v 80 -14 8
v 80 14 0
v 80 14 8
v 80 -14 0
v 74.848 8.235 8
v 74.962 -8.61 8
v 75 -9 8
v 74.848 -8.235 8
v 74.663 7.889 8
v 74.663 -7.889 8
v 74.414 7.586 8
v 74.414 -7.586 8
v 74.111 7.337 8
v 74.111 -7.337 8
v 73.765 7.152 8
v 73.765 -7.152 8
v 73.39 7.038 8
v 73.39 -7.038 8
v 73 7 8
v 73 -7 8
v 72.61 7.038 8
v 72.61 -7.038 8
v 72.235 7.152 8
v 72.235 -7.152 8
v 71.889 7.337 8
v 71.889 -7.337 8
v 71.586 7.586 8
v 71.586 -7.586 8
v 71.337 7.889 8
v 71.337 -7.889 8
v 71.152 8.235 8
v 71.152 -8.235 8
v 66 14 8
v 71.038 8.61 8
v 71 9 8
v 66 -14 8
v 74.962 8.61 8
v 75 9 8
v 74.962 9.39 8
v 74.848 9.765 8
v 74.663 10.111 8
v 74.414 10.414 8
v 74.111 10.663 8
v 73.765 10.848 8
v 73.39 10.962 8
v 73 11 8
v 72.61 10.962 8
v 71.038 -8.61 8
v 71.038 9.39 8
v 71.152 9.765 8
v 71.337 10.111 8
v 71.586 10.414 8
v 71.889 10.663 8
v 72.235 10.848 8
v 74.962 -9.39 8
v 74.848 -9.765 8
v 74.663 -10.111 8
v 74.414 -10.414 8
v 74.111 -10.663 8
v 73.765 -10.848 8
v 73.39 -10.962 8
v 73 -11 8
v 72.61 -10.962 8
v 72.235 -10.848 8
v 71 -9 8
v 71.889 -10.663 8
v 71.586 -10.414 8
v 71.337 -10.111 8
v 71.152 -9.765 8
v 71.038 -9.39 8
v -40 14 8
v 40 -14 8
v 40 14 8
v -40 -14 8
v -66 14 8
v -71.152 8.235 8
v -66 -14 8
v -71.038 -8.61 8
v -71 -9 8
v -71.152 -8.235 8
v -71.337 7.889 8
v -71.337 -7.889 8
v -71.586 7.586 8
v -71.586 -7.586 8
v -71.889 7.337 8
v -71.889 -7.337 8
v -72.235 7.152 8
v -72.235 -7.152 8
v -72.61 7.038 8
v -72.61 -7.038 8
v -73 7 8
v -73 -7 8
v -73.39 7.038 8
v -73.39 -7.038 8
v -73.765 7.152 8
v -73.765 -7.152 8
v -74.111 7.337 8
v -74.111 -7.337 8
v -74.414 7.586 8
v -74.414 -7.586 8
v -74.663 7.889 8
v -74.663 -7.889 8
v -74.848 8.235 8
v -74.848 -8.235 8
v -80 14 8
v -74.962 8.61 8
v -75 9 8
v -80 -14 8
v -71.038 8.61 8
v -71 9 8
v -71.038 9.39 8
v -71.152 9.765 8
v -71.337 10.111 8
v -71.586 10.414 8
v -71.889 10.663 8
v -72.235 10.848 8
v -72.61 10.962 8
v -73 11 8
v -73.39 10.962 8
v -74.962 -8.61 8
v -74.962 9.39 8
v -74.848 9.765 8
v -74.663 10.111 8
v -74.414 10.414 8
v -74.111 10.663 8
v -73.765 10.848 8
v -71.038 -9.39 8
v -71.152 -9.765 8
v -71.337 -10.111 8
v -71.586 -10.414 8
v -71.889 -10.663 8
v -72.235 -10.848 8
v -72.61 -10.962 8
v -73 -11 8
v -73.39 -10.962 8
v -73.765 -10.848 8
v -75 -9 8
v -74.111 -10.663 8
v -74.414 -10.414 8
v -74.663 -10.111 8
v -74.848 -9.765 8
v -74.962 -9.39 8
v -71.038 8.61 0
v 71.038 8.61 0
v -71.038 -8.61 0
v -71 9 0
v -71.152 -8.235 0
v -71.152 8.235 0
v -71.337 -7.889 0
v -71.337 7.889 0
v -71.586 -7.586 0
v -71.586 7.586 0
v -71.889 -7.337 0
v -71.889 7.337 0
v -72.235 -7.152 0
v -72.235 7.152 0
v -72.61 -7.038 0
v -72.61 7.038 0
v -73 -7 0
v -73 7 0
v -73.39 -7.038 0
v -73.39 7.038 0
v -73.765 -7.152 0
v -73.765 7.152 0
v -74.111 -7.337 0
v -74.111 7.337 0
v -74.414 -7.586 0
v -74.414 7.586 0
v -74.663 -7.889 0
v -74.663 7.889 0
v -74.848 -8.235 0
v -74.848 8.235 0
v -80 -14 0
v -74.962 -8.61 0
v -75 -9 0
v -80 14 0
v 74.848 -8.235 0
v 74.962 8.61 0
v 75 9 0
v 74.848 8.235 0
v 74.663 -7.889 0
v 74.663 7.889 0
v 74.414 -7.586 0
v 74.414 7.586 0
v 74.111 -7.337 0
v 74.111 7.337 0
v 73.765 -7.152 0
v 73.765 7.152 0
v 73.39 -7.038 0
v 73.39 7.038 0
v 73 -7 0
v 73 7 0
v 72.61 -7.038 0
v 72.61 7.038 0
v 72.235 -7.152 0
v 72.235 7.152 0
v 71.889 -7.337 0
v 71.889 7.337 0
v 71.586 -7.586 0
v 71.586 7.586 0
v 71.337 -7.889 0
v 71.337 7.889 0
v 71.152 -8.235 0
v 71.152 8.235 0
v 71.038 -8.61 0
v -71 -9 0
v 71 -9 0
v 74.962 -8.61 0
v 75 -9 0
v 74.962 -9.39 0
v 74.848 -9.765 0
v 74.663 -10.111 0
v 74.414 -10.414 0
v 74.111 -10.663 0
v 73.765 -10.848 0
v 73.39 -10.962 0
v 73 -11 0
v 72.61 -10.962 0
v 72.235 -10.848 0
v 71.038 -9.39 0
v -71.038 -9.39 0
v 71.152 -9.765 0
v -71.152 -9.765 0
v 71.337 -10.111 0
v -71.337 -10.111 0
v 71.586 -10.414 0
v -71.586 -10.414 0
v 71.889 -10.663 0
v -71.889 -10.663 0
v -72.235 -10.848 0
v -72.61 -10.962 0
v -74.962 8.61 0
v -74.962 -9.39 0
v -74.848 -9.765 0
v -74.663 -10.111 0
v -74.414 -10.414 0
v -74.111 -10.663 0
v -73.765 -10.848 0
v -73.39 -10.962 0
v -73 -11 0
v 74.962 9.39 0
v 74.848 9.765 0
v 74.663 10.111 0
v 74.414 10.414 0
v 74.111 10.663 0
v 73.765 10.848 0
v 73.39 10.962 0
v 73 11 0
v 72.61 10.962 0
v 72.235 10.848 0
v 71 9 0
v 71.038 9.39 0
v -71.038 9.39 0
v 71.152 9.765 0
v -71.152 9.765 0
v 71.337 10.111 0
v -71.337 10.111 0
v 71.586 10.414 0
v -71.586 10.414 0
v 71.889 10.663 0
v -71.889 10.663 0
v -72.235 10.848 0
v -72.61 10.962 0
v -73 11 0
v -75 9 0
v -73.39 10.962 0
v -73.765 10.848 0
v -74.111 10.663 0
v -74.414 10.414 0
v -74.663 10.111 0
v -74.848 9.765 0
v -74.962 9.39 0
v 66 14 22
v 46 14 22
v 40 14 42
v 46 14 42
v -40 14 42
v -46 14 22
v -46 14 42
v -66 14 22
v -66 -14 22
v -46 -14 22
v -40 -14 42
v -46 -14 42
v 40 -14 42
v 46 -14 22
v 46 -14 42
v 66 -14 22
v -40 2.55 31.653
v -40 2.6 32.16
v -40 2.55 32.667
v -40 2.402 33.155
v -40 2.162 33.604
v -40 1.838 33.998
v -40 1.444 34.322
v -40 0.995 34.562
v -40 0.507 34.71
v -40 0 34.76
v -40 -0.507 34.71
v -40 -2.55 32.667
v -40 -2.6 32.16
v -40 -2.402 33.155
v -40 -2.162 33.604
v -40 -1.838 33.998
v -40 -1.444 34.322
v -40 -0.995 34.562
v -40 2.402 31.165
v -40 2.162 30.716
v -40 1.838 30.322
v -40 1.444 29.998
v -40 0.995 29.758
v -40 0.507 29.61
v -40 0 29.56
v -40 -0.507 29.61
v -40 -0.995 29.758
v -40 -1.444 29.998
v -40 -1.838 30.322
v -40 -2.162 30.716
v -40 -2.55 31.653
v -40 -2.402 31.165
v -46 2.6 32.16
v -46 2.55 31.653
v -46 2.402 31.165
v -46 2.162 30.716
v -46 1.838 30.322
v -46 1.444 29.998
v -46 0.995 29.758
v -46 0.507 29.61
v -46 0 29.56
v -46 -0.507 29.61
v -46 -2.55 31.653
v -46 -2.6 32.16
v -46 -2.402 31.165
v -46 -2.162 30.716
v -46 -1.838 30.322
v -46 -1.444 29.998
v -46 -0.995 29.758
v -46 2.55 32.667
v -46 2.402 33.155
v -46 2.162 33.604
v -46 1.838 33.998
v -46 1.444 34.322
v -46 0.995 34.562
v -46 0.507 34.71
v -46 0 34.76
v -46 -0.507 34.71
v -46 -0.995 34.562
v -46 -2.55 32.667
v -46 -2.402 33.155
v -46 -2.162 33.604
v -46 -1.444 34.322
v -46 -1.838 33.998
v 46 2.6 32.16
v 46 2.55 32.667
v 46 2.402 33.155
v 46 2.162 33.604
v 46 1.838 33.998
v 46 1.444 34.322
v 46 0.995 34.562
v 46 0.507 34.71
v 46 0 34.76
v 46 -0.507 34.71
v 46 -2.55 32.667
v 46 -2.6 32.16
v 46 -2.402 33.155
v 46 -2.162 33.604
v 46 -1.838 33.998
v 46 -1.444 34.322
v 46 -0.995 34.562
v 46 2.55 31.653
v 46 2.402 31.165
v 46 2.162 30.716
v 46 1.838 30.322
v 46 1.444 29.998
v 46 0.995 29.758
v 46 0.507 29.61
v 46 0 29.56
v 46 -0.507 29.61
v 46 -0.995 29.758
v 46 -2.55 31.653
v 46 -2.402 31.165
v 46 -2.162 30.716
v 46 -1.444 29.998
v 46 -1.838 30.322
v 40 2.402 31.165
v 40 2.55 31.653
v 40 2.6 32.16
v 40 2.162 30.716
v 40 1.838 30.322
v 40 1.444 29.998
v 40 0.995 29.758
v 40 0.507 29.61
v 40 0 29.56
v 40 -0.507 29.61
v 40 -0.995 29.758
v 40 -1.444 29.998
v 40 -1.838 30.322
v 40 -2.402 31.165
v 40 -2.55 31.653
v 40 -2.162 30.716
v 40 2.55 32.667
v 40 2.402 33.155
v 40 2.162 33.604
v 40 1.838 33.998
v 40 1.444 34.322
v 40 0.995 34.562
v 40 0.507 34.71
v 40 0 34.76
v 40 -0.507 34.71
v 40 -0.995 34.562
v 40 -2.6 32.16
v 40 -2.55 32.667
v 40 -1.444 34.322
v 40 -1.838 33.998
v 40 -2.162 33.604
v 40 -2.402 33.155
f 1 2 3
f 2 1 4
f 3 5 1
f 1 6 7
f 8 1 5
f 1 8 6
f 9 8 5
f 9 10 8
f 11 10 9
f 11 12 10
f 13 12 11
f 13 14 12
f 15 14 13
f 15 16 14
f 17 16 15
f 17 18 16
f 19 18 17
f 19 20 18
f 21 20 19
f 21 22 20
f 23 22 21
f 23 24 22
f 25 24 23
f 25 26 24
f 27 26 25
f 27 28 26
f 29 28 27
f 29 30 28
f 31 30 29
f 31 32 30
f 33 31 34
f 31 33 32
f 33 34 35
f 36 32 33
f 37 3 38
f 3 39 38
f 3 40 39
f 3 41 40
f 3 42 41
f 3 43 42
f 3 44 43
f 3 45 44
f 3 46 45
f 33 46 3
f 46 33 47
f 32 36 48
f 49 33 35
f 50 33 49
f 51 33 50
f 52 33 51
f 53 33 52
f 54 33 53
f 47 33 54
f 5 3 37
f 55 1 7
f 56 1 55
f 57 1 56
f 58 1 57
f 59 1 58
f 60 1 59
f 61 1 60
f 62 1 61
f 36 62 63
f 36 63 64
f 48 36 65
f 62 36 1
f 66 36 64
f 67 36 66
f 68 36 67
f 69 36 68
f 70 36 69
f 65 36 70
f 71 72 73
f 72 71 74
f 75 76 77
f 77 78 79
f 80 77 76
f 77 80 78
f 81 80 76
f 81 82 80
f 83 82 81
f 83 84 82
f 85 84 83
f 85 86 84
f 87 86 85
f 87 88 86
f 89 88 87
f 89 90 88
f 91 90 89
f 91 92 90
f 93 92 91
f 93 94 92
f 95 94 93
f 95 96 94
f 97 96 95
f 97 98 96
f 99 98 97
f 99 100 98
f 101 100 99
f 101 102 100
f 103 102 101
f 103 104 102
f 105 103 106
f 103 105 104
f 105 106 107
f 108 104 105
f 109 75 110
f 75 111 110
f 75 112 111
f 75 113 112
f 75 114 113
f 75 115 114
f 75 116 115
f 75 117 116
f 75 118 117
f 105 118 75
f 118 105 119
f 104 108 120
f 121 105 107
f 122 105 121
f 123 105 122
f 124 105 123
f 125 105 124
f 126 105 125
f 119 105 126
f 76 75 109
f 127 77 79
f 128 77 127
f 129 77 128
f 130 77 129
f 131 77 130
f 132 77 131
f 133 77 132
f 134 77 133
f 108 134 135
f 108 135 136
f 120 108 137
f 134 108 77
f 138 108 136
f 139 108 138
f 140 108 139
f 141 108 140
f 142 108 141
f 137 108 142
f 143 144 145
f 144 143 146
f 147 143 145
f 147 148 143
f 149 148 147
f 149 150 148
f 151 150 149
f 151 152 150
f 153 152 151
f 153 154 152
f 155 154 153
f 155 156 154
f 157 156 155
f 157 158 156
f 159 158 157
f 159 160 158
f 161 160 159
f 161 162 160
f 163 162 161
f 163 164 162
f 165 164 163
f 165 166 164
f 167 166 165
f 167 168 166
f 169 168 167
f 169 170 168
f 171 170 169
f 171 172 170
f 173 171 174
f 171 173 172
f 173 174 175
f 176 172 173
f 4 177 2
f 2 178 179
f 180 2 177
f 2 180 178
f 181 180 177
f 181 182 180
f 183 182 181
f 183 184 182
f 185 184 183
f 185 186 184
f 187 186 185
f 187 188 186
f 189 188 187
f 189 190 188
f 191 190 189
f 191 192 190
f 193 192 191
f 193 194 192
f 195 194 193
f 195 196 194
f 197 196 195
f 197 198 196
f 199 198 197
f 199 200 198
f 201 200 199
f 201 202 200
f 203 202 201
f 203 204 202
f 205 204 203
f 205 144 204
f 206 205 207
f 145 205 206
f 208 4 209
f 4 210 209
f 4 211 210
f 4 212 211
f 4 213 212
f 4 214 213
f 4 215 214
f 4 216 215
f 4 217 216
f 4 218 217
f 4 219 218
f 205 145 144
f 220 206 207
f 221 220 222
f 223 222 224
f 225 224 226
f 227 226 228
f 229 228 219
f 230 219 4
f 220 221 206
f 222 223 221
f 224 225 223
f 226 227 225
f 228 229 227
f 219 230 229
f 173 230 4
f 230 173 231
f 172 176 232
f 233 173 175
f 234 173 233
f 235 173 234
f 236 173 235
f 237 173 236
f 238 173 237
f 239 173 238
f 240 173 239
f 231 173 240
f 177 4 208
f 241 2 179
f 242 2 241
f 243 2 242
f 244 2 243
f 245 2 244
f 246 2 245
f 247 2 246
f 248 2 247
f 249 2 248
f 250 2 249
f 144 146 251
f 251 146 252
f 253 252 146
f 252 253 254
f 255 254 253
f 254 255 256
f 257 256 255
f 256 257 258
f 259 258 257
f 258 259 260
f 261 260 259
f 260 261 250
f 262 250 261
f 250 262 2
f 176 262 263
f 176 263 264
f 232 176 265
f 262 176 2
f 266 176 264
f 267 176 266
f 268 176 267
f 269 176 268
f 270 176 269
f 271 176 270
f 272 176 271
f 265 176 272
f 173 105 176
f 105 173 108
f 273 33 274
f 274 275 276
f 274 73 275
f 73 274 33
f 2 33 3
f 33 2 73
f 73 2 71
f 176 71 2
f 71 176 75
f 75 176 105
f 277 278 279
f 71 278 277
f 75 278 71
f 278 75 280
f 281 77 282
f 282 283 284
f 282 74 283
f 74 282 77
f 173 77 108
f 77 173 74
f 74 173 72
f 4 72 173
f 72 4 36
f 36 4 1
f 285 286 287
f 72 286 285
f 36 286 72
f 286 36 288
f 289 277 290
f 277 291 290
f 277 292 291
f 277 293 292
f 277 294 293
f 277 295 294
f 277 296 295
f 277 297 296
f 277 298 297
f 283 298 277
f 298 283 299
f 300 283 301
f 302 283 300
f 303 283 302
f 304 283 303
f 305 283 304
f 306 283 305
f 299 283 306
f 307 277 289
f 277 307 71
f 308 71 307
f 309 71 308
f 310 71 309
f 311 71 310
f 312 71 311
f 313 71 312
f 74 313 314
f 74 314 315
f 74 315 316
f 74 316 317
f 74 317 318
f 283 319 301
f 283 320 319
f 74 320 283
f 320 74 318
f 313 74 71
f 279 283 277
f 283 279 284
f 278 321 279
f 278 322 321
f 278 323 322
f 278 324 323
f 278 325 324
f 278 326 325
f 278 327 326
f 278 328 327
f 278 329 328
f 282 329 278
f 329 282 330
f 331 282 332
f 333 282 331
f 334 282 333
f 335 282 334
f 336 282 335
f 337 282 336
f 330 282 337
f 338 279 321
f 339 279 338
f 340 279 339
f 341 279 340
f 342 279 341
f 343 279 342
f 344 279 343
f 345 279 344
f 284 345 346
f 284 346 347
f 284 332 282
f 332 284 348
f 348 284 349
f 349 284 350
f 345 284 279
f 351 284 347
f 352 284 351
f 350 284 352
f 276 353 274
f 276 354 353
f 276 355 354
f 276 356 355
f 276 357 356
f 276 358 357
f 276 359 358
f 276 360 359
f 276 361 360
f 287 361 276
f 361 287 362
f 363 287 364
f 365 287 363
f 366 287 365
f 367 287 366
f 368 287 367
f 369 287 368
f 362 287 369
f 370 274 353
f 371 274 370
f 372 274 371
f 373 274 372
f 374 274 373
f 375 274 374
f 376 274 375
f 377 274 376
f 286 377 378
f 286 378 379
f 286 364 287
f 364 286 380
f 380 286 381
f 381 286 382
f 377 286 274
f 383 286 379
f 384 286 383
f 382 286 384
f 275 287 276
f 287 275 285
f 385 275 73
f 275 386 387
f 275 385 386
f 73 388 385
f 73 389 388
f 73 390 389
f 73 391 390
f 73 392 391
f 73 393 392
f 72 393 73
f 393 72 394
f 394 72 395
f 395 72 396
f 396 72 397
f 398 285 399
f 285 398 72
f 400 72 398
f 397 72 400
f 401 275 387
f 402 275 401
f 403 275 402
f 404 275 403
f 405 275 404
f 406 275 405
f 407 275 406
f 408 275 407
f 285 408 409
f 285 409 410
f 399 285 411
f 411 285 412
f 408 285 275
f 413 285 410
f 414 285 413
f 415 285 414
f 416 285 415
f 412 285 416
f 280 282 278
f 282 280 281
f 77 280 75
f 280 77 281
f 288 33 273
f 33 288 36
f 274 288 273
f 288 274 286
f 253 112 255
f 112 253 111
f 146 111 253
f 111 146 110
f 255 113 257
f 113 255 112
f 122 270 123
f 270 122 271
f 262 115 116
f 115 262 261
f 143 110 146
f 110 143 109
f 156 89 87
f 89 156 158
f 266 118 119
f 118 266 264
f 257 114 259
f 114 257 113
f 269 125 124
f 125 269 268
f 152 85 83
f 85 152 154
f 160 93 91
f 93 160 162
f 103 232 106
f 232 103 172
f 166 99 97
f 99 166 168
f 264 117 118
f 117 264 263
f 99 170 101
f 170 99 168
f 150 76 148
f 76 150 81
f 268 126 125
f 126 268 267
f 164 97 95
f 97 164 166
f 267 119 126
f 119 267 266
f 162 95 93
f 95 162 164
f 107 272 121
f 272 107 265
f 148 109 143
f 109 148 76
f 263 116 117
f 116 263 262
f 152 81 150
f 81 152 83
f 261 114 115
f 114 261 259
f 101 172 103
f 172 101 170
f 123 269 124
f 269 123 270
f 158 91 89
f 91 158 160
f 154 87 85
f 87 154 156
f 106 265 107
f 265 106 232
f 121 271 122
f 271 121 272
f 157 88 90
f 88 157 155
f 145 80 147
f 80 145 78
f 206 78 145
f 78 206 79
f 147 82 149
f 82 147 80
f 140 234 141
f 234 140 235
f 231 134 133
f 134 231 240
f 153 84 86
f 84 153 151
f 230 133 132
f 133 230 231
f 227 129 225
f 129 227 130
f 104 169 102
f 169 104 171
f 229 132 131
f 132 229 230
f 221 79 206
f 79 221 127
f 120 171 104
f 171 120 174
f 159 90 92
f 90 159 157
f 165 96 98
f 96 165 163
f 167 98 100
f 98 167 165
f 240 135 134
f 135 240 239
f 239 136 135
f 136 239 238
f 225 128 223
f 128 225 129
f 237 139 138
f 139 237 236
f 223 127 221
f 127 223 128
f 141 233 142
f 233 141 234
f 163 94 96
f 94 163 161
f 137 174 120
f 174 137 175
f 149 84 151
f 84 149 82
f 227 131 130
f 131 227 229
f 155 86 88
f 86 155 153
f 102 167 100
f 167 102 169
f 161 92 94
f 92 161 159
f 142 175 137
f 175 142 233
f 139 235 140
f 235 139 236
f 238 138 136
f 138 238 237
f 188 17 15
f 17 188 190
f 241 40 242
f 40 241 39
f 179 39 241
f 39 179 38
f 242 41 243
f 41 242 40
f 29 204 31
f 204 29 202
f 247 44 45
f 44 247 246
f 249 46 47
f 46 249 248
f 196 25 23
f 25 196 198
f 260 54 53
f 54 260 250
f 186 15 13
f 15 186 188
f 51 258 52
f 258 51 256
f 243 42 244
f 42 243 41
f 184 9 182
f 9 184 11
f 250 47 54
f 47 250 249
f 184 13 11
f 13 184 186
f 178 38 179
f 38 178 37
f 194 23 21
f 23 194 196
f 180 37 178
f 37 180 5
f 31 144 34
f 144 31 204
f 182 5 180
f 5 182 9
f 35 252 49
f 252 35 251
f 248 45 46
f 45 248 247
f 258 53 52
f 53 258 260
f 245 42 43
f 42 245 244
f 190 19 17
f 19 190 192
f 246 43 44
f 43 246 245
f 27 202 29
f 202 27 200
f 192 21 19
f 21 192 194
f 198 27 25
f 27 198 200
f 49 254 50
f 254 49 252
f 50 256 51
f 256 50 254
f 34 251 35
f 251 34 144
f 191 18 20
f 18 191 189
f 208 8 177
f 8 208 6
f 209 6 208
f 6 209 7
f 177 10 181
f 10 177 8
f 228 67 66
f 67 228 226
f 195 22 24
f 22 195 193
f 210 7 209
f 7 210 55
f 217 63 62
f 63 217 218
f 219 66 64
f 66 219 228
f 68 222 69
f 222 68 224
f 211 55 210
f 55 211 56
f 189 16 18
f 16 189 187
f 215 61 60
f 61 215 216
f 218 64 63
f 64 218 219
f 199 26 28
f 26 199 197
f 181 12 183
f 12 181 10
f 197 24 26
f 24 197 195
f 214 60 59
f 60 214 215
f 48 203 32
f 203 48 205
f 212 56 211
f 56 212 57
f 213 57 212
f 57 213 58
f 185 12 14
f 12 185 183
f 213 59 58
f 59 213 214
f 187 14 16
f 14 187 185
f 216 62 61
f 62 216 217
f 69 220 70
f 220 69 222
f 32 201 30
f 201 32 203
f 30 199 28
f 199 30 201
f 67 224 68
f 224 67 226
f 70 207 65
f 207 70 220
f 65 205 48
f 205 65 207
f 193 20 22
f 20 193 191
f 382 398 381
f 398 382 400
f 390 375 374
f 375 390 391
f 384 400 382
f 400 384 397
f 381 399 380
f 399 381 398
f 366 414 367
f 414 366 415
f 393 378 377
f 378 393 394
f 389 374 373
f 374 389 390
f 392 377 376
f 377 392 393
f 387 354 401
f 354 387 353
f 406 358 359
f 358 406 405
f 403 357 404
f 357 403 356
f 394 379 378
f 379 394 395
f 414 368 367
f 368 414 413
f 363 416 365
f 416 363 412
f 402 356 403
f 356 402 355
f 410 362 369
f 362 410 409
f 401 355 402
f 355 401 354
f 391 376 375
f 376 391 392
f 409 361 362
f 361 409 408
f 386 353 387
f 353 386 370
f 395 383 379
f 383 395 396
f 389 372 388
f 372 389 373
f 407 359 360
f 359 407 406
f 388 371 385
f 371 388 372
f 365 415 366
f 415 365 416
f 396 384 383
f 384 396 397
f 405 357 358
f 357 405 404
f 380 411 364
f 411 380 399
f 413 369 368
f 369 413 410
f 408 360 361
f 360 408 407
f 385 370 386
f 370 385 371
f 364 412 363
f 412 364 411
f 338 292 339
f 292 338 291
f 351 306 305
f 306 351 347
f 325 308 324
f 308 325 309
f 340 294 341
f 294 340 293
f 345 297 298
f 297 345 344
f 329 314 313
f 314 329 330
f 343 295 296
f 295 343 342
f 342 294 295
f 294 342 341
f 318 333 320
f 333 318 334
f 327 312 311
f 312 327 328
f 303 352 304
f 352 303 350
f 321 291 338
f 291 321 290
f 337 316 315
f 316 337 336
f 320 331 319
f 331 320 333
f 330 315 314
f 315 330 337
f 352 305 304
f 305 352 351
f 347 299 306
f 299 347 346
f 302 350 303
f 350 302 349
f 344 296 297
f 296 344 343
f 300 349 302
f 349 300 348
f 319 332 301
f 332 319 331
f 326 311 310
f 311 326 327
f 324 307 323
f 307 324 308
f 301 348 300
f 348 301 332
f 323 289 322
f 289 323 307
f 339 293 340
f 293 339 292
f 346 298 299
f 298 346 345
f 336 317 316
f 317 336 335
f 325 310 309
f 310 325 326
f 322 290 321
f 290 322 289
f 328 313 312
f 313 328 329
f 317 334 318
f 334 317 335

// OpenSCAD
diametric_clearance = 0.32;

tt = 8;
extra_rise = 14;

difference()
{
    union()
    {
        translate([-160/2,-28/2,0])
        cube([160,28,tt]);
        
        translate([-46,-28/2,tt])
        cube([6,28,20+extra_rise]);
        
        translate([46-6,-28/2,tt])
        cube([6,28,20+extra_rise]);
        
        translate([-46-20,-28/2,tt])
        cube([6+20,28,extra_rise]);
        
        translate([46-6,-28/2,tt])
        cube([6+20,28,extra_rise]);
    }
    
    translate([-146/2,9,-1])
    cylinder(d=4,h=tt+2,$fn=32);
    
    translate([-146/2,-9,-1])
    cylinder(d=4,h=tt+2,$fn=32);
    
    translate([146/2,9,-1])
    cylinder(d=4,h=tt+2,$fn=32);
    
    translate([146/2,-9,-1])
    cylinder(d=4,h=tt+2,$fn=32);
    
    
    translate([-1+40,0,10+diametric_clearance/2+tt+extra_rise])
    rotate([0,90,0])
    cylinder(d=5.2,h=8,$fn=32);
    
    translate([1-40,0,10+diametric_clearance/2+tt+extra_rise])
    rotate([0,-90,0])
    cylinder(d=5.2,h=8,$fn=32);
}
